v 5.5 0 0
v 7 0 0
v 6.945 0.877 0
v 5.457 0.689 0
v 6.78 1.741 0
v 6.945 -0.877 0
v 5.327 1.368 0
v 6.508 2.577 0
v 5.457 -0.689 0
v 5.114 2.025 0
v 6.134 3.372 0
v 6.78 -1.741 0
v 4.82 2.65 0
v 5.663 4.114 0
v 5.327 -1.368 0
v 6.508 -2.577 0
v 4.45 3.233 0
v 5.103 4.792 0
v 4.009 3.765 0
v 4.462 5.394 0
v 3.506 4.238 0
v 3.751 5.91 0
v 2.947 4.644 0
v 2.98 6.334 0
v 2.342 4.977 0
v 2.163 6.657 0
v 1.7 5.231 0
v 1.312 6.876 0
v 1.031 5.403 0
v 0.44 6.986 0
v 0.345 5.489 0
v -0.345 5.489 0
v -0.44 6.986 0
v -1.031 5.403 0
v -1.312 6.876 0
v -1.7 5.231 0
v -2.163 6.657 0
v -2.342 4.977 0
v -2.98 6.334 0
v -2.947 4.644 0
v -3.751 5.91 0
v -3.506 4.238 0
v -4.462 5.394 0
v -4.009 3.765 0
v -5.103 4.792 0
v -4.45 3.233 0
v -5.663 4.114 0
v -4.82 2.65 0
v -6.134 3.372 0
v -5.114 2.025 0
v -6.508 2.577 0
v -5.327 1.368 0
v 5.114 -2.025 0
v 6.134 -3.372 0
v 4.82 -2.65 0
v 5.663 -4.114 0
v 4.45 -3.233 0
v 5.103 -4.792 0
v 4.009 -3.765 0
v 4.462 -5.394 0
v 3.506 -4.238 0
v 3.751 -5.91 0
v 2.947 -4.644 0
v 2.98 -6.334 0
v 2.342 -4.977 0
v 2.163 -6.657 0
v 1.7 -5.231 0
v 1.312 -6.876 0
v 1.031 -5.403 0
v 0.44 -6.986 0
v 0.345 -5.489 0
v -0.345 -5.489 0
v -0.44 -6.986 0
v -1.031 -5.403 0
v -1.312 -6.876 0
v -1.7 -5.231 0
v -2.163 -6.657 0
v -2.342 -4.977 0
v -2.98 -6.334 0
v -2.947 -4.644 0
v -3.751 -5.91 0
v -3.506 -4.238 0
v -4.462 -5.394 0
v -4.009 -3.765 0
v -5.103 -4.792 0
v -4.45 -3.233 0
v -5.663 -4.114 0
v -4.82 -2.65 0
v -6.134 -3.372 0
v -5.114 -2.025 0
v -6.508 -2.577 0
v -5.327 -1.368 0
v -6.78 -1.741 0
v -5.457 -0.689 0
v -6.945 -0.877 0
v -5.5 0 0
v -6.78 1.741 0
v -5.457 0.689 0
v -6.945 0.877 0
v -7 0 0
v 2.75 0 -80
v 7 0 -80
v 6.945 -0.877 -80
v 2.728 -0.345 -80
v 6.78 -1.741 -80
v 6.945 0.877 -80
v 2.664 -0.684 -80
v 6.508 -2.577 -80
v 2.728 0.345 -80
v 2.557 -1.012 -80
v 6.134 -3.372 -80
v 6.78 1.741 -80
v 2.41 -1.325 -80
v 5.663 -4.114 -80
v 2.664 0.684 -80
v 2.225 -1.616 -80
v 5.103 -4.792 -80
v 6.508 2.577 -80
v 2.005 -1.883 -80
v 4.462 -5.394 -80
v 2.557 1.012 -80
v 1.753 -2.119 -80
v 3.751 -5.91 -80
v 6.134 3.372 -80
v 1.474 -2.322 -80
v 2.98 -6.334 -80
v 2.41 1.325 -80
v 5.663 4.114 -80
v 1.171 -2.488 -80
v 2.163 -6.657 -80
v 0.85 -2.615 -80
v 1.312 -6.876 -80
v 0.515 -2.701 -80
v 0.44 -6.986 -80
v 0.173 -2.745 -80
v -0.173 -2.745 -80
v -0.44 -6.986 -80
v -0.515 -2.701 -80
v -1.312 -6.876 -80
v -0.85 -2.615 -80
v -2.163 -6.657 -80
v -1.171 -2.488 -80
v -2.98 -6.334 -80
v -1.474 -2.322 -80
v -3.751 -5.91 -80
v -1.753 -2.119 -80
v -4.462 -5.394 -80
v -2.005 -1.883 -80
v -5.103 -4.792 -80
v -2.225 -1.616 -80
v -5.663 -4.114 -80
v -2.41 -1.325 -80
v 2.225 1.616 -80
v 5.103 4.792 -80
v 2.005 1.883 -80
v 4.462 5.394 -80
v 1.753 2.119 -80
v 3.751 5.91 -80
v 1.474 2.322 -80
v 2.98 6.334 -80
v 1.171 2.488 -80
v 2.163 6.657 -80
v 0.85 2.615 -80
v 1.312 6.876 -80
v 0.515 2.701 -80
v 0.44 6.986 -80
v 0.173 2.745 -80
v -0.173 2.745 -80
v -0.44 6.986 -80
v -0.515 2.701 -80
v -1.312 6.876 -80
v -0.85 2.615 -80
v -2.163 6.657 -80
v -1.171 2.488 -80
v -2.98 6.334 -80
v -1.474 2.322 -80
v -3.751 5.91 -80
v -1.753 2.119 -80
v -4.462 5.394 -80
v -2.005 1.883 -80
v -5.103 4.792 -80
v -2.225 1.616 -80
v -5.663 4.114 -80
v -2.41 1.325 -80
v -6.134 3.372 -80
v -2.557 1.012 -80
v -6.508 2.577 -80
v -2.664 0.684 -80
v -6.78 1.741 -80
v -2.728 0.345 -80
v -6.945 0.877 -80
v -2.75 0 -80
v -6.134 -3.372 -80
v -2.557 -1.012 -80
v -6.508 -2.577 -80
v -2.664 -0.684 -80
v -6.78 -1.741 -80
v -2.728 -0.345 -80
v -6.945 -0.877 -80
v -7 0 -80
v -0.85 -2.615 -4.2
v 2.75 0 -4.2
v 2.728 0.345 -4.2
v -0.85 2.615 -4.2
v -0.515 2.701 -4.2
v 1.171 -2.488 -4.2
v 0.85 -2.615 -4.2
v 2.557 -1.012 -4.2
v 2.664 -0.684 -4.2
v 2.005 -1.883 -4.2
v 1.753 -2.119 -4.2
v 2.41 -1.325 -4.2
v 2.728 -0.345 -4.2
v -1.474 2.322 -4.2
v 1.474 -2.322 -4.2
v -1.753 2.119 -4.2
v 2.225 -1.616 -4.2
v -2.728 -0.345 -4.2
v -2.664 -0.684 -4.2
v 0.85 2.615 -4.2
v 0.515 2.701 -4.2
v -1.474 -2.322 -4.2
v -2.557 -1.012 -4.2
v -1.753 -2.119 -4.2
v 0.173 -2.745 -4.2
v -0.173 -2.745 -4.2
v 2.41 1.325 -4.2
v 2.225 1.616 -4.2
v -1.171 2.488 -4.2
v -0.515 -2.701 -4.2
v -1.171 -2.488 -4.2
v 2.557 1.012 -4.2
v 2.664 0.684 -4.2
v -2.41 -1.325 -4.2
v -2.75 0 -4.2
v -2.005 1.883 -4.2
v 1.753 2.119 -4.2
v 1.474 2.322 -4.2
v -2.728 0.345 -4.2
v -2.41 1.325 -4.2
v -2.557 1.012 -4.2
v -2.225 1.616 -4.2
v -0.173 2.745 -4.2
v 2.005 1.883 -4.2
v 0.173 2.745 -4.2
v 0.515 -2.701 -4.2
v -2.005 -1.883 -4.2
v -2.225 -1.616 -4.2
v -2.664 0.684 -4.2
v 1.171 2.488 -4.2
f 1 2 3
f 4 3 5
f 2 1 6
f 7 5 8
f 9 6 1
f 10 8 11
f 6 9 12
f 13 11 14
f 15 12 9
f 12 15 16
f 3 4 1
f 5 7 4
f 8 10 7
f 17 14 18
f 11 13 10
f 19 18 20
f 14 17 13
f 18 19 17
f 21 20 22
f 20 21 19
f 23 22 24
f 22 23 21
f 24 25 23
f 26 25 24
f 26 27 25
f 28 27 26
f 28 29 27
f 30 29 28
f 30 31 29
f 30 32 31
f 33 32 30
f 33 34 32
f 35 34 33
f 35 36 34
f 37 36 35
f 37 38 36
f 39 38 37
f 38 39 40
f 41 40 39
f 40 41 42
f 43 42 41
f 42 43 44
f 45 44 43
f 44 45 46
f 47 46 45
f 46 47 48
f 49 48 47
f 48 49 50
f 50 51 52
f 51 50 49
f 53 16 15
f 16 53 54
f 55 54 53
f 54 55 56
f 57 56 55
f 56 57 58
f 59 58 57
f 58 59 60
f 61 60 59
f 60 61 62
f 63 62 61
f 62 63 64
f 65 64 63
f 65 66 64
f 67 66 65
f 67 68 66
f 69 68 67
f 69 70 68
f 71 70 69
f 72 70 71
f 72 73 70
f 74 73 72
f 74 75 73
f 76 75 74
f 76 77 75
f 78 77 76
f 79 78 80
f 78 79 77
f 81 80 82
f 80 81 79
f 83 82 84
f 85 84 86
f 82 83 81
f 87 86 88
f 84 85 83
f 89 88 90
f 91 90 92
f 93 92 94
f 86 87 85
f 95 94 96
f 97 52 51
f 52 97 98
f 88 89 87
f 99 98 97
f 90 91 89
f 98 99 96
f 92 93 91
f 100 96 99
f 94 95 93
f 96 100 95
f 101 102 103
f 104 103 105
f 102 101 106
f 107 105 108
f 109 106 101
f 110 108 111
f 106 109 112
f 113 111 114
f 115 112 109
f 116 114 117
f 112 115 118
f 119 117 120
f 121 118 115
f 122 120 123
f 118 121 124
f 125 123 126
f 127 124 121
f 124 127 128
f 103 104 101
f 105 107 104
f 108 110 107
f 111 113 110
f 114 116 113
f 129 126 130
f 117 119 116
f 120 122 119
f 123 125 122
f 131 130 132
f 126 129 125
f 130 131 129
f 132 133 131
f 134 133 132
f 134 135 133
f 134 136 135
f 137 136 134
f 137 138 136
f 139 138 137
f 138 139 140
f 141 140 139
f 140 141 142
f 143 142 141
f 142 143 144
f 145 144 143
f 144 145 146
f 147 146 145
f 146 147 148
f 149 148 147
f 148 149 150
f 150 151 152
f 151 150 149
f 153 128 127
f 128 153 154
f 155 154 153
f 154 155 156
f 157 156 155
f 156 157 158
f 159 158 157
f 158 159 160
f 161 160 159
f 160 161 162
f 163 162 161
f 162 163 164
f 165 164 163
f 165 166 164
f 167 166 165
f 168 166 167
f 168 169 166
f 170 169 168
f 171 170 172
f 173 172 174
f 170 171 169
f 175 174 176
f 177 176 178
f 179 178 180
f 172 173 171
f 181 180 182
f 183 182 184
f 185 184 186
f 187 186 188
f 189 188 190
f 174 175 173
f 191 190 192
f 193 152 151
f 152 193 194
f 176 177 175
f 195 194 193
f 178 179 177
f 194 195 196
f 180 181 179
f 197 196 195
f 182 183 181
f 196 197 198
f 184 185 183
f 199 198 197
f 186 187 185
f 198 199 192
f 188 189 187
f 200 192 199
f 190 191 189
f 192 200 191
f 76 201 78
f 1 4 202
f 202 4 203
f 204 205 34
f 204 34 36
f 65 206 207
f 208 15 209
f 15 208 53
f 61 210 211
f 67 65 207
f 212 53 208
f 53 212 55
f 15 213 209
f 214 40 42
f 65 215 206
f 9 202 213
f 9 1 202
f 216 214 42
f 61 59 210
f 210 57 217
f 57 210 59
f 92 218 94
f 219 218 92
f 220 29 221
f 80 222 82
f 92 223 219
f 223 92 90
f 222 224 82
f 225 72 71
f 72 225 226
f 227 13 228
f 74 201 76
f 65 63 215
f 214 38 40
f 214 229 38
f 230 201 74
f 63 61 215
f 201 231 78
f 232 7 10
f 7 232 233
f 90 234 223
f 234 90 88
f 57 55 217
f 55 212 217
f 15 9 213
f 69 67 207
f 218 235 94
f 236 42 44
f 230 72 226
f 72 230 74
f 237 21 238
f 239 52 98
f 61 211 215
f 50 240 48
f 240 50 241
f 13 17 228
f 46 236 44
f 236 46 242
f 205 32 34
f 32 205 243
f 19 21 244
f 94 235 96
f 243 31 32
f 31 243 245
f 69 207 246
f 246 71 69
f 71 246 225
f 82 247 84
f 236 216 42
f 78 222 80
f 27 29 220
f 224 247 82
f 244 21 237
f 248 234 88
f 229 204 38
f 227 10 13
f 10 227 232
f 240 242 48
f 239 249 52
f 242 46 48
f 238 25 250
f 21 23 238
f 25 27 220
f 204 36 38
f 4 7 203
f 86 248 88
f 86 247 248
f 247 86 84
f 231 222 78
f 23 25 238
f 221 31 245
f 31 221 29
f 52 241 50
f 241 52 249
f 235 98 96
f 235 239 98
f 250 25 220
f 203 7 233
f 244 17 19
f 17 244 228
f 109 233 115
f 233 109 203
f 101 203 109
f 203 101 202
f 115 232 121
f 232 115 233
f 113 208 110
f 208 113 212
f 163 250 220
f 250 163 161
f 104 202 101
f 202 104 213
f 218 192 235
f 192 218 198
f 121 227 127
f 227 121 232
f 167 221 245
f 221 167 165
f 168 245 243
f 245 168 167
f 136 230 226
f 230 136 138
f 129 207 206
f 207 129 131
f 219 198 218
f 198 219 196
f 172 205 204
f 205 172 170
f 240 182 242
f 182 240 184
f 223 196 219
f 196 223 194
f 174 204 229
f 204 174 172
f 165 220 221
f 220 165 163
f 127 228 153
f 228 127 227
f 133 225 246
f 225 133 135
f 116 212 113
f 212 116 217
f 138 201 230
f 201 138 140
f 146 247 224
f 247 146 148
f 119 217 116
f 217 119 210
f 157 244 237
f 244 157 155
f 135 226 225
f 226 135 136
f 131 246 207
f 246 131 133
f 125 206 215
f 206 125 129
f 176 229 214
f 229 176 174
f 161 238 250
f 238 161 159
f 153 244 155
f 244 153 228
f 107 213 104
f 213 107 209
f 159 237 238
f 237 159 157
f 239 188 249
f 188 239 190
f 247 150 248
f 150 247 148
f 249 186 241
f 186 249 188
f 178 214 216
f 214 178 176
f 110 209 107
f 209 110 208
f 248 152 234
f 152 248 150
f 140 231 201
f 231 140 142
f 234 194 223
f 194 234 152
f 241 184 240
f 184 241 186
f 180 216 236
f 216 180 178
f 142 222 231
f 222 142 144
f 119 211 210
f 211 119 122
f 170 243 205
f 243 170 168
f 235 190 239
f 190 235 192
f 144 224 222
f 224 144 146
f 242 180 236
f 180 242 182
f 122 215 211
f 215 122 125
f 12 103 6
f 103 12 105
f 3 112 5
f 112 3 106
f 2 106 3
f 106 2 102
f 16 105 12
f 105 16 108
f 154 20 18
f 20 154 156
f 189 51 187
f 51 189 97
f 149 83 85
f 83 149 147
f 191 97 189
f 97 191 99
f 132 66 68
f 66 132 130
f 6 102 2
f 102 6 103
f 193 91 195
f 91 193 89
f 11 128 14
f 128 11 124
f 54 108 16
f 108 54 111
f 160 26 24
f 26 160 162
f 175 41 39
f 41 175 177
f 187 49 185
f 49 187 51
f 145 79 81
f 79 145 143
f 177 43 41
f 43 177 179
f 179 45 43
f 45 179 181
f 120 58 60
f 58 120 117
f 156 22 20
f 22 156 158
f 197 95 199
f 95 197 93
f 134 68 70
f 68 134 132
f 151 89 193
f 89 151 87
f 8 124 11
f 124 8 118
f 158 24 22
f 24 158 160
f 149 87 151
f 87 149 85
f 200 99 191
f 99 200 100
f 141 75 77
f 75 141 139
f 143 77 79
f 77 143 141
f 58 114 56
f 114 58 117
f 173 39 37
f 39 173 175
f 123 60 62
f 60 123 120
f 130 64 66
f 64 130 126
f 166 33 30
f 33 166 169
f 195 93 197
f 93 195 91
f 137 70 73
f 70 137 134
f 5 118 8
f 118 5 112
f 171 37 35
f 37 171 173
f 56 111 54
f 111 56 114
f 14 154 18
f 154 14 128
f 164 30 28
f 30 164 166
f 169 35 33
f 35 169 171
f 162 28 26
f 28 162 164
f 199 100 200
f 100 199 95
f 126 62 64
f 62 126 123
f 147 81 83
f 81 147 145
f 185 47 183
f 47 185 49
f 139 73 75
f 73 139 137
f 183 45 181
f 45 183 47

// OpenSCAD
$fn = 50;


difference() {
	union() {
		translate(v = [0, 0, -80.0000000000]) {
			cylinder(h = 80, r = 7.0000000000);
		}
		cylinder(h = 0, r = 17.0000000000);
	}
	union() {
		translate(v = [0, 0, 0]) {
			rotate(a = [0, 0, 0]) {
				difference() {
					union() {
						#translate(v = [0, 0, -80.0000000000]) {
							cylinder(h = 80, r = 2.2500000000);
						}
						#translate(v = [0, 0, -4.2000000000]) {
							cylinder(h = 4.2000000000, r = 7.0000000000, r1 = 2.7500000000, r2 = 5.5000000000);
						}
						#translate(v = [0, 0, -80.0000000000]) {
							cylinder(h = 80, r = 2.7500000000);
						}
						#translate(v = [0, 0, -80.0000000000]) {
							cylinder(h = 80, r = 2.2500000000);
						}
					}
					union();
				}
			}
		}
	}
}
